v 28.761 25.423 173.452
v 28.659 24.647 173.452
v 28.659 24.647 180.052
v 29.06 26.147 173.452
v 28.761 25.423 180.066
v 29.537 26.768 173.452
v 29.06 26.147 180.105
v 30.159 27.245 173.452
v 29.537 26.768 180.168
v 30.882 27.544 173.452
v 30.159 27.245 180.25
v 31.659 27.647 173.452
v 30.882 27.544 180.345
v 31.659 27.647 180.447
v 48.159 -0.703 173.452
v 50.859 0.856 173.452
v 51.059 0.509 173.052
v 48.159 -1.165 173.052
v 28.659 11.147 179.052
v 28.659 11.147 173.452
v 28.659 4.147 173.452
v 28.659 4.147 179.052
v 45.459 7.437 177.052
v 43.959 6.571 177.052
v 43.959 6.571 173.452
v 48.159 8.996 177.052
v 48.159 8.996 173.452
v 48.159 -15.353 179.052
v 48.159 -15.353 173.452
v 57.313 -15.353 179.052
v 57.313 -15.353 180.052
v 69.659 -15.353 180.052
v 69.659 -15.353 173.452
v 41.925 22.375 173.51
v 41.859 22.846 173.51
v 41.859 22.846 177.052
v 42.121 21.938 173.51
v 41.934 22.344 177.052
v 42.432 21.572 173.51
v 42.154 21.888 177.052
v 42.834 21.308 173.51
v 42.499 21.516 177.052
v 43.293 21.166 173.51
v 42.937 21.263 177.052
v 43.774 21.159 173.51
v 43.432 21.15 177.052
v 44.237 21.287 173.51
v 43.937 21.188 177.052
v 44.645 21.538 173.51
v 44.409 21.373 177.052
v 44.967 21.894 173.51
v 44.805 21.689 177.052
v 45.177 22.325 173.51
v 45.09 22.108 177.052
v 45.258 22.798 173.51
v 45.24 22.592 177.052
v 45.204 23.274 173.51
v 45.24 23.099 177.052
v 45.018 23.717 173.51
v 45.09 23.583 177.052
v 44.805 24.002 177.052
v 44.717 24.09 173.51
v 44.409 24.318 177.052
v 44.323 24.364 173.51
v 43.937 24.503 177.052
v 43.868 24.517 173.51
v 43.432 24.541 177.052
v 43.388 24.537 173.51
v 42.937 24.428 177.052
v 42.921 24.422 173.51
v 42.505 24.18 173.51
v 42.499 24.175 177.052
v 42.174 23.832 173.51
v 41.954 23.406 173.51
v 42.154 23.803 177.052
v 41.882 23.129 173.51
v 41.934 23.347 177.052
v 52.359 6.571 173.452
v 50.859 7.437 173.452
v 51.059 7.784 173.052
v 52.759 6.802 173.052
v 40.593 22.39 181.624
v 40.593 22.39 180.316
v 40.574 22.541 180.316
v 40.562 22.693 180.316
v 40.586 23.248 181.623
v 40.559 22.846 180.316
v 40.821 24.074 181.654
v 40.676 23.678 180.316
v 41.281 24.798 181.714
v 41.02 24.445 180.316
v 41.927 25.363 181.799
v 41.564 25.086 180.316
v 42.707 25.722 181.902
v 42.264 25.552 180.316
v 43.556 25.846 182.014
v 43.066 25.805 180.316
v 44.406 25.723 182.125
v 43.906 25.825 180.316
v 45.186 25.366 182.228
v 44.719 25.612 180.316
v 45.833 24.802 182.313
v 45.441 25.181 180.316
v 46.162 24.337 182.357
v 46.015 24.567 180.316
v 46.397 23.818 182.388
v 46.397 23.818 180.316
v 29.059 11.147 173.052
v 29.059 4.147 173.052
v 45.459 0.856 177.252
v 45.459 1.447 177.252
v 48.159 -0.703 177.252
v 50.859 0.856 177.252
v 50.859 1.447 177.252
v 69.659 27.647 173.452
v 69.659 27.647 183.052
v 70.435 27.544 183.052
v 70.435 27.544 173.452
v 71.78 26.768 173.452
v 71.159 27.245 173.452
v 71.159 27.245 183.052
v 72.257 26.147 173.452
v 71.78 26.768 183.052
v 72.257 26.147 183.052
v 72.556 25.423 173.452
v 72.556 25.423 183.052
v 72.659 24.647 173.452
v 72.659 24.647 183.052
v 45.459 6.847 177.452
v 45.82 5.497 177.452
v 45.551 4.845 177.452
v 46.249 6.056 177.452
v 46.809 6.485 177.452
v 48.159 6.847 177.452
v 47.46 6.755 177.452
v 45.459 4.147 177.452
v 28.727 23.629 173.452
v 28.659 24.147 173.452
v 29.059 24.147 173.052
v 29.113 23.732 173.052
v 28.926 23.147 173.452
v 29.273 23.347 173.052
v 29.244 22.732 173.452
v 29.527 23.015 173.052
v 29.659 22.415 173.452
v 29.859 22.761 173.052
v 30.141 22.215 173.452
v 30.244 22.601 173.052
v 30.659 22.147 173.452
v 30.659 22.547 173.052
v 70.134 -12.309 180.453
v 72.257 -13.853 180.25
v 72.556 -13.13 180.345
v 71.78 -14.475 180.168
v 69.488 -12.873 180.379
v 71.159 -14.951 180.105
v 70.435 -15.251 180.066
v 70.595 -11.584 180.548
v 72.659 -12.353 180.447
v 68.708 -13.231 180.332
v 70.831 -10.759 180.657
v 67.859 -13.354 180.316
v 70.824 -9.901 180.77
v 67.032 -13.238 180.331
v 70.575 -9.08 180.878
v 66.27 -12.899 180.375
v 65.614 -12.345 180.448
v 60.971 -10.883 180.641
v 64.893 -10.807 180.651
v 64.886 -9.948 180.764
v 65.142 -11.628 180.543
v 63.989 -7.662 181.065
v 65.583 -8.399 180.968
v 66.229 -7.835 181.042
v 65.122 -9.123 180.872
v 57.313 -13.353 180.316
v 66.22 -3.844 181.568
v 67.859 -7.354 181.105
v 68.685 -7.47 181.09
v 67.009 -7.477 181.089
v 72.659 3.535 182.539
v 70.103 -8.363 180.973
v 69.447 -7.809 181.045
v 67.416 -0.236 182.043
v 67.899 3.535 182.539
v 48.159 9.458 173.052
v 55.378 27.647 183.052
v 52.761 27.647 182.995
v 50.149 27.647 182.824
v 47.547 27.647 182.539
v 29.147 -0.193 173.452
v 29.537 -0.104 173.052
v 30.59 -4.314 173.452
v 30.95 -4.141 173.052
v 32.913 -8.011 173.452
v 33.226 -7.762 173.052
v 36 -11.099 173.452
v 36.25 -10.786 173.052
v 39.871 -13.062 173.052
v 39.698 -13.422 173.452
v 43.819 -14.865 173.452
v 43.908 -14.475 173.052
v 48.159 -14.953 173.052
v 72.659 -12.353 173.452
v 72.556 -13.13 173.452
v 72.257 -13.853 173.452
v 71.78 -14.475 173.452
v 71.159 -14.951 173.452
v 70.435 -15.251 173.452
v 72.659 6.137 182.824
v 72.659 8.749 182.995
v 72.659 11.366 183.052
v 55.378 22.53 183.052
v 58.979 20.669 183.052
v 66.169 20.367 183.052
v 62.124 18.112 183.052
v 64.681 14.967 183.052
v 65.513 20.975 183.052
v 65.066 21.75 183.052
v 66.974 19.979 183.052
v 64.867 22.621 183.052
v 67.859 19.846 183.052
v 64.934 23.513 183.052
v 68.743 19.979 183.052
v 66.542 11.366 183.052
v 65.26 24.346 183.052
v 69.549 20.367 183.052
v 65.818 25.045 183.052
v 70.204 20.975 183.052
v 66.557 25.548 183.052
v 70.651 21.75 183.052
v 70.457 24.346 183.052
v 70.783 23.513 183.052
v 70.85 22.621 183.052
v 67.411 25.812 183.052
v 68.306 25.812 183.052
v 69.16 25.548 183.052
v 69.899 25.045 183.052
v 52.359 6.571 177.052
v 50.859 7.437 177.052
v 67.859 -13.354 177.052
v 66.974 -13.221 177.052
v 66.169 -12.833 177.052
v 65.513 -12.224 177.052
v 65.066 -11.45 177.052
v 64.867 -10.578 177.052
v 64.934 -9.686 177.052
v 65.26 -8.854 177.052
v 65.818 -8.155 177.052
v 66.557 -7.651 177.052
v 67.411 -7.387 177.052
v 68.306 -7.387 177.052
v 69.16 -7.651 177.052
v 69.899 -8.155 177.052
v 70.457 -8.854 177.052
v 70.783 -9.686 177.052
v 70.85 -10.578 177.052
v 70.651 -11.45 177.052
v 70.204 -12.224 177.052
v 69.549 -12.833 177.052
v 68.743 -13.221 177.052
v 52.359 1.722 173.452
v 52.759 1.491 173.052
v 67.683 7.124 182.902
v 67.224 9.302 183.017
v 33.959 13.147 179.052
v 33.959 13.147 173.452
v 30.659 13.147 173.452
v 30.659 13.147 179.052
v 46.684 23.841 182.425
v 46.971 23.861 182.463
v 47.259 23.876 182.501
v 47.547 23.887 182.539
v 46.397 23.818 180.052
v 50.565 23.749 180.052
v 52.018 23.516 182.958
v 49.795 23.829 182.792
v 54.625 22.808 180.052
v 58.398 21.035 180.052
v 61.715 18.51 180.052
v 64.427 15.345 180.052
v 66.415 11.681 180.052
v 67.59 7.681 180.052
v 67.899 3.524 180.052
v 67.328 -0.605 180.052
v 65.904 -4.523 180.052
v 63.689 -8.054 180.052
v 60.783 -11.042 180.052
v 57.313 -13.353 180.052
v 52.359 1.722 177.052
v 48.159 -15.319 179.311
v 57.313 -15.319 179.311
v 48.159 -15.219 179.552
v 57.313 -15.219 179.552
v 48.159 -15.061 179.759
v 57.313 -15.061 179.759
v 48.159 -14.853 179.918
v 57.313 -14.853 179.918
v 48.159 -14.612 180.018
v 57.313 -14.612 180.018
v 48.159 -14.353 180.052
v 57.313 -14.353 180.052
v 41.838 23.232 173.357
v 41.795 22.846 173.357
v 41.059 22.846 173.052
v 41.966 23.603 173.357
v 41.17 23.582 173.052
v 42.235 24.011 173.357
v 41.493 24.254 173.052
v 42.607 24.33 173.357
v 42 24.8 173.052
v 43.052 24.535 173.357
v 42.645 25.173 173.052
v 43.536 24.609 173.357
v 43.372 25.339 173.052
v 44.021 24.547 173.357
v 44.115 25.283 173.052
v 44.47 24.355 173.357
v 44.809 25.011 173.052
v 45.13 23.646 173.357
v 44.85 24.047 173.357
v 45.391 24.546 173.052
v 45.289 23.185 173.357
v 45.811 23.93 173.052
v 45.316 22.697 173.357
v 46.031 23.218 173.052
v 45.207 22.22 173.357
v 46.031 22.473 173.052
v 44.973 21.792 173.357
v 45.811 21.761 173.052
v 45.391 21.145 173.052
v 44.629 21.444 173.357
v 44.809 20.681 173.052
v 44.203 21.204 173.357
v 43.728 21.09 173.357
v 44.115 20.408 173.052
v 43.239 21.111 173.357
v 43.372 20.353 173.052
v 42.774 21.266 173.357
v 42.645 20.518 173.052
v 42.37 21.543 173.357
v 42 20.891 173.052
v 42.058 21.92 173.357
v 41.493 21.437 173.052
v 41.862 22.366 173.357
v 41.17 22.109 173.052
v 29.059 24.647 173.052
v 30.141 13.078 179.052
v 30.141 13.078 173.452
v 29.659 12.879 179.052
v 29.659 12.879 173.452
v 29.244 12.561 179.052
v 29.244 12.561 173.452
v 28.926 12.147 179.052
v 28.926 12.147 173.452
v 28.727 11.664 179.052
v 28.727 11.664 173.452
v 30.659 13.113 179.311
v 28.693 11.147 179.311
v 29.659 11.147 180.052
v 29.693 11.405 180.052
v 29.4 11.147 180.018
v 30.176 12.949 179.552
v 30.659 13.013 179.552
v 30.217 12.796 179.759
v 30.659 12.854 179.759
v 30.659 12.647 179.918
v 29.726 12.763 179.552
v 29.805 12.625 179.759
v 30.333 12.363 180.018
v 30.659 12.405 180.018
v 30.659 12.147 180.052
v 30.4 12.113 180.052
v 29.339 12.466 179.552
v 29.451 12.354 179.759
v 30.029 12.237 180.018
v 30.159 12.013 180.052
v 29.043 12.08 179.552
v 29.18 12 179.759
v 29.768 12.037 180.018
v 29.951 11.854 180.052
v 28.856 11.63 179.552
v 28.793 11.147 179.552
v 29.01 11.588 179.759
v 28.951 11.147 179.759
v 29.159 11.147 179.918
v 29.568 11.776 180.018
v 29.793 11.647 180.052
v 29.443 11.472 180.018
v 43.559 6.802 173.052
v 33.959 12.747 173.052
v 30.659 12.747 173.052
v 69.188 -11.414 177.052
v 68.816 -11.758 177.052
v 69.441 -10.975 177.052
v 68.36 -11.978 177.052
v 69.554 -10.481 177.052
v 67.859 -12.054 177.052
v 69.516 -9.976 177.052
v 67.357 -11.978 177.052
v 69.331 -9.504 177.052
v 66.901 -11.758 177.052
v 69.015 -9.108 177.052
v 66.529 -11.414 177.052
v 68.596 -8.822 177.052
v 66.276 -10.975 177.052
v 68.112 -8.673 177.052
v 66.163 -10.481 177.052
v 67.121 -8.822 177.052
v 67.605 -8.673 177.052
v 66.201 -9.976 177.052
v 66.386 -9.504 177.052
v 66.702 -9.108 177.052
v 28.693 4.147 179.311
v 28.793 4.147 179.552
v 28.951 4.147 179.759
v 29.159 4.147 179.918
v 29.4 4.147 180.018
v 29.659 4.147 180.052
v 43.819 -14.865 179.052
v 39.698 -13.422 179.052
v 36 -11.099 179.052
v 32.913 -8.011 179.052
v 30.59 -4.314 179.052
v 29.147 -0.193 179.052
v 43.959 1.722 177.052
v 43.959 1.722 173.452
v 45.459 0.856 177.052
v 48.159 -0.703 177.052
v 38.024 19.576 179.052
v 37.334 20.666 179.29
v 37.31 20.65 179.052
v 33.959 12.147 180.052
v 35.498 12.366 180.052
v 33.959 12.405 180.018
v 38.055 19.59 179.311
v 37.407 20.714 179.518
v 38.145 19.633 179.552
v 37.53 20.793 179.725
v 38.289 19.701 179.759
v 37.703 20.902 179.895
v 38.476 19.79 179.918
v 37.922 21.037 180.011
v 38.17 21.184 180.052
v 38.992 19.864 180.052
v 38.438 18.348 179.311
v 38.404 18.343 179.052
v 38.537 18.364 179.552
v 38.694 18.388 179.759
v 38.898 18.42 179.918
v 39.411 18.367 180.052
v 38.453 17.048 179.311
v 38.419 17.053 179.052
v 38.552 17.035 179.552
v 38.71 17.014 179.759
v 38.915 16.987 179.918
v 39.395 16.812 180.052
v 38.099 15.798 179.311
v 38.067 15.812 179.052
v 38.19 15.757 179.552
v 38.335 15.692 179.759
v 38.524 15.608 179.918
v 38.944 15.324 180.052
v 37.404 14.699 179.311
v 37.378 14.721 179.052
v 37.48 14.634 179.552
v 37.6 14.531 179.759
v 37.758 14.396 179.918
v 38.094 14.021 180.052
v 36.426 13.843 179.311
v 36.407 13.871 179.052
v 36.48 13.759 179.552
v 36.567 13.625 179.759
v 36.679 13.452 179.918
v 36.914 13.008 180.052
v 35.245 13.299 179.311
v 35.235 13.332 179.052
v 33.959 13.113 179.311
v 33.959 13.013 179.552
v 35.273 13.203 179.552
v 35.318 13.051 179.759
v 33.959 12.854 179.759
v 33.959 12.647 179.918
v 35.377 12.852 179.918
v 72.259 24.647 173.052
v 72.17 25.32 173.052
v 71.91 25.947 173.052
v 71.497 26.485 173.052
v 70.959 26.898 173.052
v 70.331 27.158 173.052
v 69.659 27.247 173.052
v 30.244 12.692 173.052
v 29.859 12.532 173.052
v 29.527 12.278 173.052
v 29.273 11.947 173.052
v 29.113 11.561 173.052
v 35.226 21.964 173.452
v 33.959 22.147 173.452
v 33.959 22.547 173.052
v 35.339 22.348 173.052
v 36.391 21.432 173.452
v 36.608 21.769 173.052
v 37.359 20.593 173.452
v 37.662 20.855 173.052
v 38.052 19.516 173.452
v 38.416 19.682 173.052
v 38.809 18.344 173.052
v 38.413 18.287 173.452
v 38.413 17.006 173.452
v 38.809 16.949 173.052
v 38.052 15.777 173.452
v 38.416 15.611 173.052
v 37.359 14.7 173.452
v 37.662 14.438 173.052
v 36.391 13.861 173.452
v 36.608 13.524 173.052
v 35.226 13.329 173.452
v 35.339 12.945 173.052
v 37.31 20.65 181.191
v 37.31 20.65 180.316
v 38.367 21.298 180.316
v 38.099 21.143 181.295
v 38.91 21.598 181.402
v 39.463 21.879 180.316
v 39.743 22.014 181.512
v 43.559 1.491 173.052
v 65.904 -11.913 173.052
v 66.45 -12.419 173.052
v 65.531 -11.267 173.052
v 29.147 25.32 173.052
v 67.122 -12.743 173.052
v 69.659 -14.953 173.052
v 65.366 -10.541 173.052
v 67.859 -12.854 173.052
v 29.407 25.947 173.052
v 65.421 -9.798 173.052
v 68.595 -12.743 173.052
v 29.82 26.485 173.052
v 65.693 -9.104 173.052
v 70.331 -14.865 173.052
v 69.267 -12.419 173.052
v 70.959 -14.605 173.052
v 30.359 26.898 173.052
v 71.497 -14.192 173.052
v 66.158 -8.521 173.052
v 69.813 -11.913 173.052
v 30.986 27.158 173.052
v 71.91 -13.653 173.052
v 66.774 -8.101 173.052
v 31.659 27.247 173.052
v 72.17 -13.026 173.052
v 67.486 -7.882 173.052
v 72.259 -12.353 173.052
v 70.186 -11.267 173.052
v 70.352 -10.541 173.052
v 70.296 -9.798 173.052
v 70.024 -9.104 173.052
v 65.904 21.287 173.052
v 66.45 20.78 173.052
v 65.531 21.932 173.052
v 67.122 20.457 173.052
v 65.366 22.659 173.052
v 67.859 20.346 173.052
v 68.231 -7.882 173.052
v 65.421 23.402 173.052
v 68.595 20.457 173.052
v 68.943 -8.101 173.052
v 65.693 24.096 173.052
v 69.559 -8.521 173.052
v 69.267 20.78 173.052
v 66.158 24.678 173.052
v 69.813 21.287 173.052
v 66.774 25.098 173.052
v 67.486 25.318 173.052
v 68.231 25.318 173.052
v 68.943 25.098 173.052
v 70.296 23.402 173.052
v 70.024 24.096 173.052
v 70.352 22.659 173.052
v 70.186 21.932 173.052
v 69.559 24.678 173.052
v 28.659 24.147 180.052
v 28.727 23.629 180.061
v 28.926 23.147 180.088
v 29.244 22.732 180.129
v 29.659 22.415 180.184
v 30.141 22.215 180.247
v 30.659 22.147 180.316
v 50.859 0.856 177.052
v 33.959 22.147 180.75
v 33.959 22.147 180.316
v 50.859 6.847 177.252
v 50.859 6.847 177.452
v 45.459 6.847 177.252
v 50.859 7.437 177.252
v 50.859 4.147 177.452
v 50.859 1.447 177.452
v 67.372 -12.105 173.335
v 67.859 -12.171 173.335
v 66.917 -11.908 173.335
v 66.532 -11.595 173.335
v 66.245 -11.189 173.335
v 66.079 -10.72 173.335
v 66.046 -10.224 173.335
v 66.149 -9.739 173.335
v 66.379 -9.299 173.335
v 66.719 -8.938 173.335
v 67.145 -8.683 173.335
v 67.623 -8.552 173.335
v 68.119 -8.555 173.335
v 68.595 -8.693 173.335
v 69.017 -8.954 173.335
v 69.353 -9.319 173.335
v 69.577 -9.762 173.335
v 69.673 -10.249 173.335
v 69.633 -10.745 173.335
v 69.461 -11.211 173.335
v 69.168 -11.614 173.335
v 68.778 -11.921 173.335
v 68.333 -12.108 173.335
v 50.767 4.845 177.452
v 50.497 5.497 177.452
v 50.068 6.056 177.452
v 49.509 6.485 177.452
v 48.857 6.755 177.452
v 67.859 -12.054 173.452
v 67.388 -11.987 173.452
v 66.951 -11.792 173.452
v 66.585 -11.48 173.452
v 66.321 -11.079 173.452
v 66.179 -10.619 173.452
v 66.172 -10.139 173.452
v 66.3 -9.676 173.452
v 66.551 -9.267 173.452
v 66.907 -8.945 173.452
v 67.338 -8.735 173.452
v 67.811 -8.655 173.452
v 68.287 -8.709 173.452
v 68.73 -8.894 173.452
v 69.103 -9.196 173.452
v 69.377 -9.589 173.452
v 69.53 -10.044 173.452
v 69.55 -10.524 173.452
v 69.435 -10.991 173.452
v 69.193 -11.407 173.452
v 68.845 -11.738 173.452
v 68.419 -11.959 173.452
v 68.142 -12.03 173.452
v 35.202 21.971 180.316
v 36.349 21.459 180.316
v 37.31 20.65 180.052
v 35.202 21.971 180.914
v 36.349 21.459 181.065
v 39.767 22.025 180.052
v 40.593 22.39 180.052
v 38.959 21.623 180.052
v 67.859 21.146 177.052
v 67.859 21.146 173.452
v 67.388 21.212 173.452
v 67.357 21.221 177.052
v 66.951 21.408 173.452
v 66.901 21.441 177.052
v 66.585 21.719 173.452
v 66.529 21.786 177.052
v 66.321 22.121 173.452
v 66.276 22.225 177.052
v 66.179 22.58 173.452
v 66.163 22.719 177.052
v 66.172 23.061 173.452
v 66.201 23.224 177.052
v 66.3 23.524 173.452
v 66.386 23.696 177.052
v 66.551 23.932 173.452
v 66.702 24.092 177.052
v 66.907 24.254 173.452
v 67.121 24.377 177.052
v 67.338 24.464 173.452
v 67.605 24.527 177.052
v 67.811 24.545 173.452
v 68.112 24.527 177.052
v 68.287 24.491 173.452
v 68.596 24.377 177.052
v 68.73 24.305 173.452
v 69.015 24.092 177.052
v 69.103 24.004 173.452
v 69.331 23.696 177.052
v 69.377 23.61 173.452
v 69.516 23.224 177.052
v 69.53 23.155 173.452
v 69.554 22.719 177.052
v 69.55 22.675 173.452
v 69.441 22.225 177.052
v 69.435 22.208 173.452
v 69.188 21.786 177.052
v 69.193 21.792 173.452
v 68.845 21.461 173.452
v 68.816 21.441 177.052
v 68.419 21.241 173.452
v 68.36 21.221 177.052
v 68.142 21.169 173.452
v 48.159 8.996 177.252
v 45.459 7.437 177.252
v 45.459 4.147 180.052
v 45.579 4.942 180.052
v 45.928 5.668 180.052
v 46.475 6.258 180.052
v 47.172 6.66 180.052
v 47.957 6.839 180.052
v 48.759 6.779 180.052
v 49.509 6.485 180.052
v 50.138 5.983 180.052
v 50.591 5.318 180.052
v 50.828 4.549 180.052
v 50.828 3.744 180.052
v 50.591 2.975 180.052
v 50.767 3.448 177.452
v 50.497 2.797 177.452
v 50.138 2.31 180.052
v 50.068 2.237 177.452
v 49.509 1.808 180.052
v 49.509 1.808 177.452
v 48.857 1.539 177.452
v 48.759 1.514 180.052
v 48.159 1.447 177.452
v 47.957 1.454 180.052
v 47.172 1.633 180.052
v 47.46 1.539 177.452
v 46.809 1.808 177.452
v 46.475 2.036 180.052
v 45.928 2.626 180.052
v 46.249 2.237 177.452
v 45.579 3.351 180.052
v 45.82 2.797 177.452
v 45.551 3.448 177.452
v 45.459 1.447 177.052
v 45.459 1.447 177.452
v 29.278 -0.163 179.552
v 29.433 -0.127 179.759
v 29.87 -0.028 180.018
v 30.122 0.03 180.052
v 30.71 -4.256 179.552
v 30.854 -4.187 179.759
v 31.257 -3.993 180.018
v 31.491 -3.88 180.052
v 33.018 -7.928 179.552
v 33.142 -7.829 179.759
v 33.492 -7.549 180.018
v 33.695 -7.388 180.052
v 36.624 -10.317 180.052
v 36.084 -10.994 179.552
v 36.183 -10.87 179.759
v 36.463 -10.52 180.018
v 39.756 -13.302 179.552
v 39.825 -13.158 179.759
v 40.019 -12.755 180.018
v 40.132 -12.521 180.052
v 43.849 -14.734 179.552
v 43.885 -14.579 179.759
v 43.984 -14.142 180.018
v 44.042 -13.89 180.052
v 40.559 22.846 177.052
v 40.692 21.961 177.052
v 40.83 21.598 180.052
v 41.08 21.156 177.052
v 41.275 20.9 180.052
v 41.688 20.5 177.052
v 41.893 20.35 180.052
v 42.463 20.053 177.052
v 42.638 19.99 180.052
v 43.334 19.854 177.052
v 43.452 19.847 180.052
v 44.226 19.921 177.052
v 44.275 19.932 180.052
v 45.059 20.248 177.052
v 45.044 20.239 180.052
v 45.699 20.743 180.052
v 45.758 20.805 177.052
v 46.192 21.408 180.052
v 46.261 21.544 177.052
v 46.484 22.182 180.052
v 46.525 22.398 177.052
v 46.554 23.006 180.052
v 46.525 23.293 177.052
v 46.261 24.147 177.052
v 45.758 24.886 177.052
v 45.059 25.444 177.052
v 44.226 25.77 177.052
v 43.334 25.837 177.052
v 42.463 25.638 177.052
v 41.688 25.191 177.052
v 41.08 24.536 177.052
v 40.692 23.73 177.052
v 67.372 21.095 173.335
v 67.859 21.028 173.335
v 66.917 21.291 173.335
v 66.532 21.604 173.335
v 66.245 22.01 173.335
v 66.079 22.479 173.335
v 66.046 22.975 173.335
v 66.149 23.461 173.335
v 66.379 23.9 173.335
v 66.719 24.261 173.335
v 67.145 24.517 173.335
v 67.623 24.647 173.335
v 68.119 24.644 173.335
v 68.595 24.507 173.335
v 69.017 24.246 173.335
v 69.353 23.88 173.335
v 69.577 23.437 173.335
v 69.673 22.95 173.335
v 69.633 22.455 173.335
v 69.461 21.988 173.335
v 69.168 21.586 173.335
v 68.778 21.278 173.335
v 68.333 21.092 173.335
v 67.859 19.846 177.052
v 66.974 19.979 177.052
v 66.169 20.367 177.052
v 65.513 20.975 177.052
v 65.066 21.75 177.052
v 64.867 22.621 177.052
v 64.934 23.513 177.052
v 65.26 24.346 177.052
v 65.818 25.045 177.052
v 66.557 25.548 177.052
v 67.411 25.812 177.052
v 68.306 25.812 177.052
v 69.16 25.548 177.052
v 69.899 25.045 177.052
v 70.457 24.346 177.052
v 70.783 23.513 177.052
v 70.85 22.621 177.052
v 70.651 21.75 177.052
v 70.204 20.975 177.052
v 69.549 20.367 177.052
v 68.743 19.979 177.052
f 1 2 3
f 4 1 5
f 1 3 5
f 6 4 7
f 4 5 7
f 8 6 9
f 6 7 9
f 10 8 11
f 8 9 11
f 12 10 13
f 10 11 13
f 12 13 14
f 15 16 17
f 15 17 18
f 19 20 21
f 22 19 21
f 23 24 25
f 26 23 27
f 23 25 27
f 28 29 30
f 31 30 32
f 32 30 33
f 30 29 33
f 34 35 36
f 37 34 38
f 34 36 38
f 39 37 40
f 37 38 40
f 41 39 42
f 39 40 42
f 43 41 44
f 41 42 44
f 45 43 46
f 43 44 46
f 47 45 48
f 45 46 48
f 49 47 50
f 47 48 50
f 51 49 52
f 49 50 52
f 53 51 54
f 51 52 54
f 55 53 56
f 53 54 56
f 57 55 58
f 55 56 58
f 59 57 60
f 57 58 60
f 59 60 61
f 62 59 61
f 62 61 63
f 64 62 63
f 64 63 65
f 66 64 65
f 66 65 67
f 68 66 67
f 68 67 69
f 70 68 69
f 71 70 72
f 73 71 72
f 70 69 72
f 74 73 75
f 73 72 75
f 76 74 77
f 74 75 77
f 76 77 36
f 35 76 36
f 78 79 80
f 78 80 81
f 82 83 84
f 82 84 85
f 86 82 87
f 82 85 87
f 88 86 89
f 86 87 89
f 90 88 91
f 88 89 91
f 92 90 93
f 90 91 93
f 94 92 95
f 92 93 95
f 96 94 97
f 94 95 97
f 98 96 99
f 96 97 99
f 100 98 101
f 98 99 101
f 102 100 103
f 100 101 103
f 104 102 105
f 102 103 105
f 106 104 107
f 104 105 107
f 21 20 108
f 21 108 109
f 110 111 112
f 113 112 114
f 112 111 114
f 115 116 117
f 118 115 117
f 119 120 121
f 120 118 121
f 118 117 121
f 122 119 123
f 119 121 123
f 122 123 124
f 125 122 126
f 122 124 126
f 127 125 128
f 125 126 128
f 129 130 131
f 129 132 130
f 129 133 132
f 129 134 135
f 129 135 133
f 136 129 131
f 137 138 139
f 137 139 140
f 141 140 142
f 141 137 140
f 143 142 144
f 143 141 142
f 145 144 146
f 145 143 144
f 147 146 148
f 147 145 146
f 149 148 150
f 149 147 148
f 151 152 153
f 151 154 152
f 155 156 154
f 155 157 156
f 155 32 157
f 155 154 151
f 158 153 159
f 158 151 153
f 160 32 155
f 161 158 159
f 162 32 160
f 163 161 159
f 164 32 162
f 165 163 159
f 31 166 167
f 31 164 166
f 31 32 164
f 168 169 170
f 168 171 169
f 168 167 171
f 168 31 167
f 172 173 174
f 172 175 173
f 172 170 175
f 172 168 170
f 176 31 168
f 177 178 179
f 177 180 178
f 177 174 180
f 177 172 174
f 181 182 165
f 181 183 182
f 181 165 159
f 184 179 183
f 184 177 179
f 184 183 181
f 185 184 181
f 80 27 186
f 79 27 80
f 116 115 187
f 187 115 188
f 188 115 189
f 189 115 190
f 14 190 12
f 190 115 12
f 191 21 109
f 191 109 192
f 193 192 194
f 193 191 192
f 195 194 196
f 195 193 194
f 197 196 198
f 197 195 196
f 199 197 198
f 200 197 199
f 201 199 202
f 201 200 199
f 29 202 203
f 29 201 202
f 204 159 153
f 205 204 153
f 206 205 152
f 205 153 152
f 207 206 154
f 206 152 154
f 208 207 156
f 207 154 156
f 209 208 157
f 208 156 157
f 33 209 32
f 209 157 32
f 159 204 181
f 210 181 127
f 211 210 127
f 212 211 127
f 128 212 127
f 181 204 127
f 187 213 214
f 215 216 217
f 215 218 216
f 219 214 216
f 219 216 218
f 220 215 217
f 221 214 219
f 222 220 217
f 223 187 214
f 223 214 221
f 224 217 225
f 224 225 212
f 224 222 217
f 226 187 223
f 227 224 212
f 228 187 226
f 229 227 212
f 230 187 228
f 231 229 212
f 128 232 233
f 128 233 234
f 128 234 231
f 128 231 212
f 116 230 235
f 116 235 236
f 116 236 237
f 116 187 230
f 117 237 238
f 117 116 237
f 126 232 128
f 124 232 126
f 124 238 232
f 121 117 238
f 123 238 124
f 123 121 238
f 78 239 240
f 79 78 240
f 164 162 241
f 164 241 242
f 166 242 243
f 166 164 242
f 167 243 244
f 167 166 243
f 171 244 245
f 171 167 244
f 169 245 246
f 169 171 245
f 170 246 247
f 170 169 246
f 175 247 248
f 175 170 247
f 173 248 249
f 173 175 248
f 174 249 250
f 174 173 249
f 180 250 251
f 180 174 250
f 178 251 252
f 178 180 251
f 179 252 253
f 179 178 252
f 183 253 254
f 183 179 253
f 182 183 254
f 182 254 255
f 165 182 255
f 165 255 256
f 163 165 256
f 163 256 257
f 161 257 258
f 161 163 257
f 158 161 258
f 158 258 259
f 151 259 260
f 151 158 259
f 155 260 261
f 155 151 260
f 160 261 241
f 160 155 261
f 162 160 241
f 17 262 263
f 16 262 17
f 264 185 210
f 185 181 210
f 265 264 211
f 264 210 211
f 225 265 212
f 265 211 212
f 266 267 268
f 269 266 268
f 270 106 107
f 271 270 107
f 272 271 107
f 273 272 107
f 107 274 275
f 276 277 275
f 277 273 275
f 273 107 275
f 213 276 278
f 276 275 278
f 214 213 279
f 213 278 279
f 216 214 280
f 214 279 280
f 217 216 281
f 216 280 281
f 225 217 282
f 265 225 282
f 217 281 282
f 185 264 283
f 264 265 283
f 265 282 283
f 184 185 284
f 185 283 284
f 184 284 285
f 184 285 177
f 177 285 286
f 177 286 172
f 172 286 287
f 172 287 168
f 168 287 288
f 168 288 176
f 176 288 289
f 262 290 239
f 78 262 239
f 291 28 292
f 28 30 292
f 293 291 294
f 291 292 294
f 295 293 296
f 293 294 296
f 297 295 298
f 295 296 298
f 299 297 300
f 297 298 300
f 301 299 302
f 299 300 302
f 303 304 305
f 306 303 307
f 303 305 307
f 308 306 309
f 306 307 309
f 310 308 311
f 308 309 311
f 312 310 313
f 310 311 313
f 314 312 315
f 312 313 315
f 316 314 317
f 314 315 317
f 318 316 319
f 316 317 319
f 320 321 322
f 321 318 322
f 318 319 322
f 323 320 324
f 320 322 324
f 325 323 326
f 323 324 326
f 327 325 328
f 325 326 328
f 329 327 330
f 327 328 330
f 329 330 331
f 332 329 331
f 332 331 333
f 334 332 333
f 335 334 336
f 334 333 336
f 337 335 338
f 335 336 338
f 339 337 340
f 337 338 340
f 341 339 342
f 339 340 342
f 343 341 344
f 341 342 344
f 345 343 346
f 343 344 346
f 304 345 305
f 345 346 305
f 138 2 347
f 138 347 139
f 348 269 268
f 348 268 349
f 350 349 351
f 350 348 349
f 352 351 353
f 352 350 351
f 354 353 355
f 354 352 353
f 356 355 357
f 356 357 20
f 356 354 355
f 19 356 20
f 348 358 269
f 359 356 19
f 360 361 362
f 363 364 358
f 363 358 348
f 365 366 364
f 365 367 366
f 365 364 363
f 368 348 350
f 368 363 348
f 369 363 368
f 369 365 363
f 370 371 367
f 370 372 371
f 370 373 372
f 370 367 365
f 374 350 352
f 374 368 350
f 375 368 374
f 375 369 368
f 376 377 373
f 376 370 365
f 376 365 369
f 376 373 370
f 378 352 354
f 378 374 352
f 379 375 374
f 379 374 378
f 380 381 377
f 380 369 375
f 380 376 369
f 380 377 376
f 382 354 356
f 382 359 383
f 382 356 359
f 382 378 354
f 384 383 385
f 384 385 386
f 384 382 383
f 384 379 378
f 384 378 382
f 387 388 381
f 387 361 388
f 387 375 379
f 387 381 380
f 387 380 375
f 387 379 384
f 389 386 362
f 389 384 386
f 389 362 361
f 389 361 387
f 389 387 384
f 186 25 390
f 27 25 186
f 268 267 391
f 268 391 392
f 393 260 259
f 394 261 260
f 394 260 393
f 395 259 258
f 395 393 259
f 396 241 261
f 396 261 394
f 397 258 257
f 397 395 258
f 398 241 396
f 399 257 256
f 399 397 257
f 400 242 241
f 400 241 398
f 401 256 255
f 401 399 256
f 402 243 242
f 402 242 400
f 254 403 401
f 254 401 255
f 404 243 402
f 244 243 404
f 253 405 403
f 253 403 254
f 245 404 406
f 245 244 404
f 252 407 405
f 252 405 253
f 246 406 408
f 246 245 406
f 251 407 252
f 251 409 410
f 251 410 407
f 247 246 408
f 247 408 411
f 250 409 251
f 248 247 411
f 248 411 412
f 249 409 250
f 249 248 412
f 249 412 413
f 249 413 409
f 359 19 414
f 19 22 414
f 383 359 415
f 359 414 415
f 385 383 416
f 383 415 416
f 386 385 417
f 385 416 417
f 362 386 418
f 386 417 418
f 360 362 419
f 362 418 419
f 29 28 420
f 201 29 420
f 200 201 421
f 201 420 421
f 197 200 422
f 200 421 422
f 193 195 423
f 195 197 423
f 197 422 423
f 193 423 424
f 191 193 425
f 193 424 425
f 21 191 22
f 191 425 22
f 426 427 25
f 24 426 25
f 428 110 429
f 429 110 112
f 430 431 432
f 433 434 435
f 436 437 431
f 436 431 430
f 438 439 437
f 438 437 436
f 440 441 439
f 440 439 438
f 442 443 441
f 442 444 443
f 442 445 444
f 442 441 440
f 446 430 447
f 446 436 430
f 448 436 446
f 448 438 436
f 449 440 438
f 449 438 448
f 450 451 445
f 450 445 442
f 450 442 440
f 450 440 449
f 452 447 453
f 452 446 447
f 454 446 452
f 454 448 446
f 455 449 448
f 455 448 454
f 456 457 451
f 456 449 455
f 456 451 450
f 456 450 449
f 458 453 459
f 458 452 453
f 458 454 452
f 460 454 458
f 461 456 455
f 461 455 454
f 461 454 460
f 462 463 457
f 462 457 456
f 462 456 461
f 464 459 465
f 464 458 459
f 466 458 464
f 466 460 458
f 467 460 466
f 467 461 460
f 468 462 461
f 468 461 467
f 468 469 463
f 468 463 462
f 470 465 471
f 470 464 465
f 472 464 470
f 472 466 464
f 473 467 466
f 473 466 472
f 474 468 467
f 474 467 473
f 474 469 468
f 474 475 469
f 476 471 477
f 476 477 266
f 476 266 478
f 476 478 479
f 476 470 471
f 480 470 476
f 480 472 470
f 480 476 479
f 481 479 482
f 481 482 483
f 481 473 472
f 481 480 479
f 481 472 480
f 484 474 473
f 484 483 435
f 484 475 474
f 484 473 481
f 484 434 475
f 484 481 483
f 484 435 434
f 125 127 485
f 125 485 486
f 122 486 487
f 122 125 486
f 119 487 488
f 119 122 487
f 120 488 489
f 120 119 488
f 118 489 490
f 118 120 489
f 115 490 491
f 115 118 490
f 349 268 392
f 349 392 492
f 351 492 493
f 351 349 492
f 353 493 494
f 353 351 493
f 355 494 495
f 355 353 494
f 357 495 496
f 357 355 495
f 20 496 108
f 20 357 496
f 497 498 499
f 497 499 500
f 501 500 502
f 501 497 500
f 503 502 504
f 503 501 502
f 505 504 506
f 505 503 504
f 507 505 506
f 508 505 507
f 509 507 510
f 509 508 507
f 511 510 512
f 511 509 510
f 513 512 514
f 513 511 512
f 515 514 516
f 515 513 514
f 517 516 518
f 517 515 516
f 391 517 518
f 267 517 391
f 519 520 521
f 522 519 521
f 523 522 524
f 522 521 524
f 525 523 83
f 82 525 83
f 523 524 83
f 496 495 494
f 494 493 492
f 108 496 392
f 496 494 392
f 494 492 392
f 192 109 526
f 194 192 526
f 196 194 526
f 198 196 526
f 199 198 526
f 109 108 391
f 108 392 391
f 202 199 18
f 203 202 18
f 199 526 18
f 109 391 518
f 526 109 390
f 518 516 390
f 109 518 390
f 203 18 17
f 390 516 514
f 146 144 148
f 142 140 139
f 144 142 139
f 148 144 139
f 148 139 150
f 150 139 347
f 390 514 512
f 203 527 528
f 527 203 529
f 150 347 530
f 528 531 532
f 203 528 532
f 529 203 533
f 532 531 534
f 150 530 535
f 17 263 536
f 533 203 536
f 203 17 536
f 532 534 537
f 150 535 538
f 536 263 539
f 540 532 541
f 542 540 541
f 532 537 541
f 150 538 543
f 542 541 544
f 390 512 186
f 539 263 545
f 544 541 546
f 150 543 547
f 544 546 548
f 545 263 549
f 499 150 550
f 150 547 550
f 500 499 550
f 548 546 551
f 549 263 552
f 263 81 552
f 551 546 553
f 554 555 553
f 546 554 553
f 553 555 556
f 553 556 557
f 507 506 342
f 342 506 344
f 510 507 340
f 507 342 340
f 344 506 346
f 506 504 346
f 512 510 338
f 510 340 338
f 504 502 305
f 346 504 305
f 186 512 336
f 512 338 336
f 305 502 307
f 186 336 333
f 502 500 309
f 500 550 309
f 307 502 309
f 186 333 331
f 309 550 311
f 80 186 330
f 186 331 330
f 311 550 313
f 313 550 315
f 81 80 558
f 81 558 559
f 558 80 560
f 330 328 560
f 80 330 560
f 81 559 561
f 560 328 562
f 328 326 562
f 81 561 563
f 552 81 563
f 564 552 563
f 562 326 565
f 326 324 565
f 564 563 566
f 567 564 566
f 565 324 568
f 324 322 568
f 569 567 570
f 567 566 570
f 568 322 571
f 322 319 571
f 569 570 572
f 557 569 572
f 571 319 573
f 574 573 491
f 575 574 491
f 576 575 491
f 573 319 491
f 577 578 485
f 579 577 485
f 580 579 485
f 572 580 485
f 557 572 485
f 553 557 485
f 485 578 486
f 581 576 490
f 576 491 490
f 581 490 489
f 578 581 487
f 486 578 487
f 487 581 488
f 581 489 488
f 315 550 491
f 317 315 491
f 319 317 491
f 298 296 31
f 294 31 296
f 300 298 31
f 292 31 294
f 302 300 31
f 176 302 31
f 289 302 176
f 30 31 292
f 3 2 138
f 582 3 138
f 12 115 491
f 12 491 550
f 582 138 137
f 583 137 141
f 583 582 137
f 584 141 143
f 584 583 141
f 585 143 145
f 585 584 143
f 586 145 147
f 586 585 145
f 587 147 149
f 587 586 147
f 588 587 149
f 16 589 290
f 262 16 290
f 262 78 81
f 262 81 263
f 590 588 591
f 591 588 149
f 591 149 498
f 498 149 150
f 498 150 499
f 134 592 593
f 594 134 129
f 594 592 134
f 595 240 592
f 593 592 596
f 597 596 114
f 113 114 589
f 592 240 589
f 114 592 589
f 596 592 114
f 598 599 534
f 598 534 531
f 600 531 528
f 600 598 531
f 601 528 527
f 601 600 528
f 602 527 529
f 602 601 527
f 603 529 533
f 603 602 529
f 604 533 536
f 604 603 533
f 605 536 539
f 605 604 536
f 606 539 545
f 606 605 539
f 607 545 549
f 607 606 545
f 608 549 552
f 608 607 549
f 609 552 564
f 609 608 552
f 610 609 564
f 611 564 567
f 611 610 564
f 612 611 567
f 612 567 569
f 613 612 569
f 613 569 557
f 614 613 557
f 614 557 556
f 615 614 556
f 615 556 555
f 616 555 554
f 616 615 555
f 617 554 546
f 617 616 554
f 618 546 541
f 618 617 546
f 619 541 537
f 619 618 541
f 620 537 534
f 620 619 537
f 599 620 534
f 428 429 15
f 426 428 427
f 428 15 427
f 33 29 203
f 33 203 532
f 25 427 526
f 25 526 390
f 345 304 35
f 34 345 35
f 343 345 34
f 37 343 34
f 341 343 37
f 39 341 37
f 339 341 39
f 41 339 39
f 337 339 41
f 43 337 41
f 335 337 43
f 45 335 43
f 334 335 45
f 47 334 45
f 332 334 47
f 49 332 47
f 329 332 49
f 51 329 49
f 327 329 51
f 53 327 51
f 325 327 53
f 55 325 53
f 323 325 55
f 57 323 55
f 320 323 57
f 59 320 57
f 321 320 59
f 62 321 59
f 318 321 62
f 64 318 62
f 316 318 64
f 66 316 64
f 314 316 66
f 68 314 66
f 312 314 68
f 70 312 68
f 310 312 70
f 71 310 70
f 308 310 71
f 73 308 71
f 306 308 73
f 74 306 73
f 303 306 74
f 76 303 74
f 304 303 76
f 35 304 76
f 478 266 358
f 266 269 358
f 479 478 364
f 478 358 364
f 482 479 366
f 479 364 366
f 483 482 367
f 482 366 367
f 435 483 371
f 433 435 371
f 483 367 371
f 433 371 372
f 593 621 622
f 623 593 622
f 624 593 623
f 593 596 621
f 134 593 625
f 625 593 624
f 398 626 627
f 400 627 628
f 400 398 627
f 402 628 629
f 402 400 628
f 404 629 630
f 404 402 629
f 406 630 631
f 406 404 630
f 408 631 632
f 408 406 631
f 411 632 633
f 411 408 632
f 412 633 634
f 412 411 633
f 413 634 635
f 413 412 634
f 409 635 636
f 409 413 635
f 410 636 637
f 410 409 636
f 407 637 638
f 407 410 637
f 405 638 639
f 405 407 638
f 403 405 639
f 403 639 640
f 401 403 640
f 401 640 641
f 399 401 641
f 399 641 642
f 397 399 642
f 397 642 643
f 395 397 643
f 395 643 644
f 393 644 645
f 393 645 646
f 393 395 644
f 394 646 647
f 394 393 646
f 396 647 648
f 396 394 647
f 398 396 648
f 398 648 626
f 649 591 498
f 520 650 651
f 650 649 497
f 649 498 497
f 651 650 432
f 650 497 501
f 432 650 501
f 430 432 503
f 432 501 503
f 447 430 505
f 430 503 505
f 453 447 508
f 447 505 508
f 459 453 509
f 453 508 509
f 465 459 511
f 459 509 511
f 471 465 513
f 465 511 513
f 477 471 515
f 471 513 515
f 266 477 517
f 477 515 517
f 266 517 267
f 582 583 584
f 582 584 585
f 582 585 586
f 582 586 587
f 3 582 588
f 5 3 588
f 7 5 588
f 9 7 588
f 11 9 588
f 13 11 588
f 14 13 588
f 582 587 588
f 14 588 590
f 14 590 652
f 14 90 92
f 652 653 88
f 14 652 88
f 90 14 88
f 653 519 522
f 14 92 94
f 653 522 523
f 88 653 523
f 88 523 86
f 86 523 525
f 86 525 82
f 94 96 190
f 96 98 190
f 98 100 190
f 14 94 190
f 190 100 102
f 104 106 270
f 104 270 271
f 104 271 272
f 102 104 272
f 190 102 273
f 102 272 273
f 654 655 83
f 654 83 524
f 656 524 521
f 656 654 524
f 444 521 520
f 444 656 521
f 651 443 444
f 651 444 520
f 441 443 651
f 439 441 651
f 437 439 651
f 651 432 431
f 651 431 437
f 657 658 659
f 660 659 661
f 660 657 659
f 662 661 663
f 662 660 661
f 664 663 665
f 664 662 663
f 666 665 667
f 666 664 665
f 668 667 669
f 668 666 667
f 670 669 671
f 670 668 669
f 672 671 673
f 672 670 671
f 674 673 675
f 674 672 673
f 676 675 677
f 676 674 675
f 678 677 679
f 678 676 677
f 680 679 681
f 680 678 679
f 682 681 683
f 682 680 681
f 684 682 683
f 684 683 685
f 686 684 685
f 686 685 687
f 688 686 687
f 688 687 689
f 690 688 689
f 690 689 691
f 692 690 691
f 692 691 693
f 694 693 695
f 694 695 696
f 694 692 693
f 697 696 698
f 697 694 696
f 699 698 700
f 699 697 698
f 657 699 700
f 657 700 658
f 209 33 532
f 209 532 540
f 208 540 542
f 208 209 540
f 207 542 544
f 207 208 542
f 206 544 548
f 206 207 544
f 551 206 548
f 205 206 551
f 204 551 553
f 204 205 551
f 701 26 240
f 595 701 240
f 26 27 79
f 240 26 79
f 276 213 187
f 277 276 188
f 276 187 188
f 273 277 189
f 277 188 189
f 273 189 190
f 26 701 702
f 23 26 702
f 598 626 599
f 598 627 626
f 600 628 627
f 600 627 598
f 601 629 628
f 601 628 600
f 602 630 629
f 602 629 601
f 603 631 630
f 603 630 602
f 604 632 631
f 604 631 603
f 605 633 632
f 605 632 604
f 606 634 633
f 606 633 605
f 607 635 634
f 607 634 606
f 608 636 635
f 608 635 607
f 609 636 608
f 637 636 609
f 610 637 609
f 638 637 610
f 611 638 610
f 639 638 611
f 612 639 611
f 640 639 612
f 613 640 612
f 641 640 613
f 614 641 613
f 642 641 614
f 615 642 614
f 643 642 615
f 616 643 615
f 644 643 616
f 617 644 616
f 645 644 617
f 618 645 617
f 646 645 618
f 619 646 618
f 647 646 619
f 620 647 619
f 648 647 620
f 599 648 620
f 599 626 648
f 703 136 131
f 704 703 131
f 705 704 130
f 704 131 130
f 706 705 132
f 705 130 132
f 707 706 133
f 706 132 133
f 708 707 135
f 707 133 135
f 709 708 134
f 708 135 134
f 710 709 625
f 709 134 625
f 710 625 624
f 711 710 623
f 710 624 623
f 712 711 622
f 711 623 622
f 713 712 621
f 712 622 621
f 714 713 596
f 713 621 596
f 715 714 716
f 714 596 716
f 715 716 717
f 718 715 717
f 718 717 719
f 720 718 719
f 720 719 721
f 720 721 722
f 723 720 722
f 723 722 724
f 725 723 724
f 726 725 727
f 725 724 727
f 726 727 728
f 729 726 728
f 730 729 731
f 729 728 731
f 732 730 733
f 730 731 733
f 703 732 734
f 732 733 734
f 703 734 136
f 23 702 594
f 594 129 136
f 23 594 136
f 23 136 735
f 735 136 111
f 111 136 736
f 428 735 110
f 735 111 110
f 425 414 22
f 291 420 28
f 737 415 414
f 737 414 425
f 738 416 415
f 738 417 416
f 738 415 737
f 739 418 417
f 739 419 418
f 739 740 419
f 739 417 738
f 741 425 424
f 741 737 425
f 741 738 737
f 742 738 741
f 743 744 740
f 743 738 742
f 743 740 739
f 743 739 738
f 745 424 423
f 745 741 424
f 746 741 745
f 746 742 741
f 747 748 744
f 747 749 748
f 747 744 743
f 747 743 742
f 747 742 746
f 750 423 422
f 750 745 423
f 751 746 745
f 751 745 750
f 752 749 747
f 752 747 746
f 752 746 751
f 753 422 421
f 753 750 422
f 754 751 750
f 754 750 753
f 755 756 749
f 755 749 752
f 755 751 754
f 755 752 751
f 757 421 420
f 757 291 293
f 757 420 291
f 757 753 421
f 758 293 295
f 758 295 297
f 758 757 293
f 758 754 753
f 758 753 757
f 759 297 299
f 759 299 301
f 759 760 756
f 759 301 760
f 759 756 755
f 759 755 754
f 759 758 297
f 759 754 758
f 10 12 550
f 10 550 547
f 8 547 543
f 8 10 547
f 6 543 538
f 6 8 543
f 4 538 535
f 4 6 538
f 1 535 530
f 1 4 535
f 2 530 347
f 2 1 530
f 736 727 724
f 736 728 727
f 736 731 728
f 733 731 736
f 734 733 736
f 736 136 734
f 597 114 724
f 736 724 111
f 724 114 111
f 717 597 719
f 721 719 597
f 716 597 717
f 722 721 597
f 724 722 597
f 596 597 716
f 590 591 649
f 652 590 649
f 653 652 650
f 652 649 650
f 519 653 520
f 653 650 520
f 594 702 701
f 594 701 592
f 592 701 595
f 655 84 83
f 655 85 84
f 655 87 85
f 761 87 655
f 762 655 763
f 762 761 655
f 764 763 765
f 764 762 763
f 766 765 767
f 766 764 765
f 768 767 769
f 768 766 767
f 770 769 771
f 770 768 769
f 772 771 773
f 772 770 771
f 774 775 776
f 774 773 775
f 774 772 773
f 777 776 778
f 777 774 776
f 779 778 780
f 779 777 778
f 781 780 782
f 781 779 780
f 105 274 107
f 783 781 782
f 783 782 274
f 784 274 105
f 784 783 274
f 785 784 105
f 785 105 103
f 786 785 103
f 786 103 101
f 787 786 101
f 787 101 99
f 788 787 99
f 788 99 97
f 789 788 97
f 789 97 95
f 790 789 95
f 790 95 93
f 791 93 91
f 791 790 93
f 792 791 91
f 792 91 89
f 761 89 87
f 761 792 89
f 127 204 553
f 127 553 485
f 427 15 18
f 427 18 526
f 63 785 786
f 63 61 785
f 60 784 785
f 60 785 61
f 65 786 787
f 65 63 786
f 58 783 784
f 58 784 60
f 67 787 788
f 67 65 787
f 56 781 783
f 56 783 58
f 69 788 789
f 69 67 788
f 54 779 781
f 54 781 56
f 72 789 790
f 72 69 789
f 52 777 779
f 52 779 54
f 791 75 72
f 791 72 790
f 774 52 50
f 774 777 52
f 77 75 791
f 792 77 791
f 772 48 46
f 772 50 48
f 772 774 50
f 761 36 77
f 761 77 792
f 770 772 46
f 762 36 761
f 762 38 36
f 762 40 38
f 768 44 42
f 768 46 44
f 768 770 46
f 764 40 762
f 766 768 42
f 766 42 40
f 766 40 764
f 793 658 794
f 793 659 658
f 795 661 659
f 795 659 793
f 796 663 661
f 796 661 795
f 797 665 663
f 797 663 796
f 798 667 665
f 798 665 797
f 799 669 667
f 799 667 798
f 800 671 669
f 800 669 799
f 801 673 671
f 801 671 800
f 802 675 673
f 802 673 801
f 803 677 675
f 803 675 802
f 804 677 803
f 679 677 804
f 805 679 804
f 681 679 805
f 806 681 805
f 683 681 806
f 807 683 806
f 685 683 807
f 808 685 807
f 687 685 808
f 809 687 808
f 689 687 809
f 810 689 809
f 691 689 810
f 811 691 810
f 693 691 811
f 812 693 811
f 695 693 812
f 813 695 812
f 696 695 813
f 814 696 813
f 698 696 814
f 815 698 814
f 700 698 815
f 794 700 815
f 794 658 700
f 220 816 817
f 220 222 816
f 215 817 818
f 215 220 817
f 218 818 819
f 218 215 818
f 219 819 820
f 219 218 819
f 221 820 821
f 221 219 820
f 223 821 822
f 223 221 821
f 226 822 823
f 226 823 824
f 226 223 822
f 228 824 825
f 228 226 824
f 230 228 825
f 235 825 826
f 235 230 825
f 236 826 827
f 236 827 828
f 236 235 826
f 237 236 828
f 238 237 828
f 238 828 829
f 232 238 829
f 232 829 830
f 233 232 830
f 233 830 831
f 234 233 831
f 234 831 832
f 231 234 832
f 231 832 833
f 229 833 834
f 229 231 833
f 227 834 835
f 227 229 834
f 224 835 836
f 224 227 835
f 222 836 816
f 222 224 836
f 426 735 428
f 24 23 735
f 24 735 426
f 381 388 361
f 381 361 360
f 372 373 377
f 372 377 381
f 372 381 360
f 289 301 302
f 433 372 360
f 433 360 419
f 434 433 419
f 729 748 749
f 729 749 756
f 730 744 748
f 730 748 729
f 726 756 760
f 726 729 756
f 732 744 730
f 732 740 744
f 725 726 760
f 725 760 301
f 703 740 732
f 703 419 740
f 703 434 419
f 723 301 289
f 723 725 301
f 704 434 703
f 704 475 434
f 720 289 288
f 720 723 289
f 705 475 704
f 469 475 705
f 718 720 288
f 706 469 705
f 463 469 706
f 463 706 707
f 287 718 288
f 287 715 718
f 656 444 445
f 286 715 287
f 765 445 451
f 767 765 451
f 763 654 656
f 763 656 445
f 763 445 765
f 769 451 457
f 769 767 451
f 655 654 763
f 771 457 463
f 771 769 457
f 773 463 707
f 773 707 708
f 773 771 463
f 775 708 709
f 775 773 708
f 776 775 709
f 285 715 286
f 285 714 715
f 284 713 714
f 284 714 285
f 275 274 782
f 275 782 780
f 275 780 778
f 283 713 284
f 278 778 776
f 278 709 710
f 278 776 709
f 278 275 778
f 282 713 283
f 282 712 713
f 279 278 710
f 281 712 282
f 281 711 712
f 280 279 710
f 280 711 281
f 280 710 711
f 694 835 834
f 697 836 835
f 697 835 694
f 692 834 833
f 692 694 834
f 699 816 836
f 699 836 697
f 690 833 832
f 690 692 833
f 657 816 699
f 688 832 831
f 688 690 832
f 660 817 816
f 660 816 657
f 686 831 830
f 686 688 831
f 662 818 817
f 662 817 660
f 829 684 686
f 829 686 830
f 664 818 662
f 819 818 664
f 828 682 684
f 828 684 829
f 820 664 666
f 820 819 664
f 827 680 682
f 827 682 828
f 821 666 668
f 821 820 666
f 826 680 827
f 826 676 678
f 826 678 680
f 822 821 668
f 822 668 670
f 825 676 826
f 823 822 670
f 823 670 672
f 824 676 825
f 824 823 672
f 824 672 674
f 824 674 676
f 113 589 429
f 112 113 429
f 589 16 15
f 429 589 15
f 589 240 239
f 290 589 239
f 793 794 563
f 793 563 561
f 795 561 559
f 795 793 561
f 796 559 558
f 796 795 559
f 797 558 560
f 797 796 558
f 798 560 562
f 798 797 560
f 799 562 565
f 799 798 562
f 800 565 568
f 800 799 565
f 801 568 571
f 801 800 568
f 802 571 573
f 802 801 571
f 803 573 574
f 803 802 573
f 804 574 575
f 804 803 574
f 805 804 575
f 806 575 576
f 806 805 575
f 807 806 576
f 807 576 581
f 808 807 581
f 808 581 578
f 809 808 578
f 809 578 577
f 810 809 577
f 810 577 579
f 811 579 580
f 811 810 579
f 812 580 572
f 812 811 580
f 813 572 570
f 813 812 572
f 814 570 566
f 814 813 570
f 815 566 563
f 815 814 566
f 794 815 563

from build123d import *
from OCP.BRepFilletAPI import BRepFilletAPI_MakeChamfer

# Parameters (mm, degrees)
CUT_EXTRUDE1_START         = -8.138931699
CUT_EXTRUDE1_DEPTH         = 7.263304995
CUT_EXTRUDE1_START_2       = -0.875626704
CUT_EXTRUDE1_2_DEPTH       = 2.736695005
CUT_EXTRUDE1_START_3       = 57.3134639
CUT_EXTRUDE1_3_DEPTH       = 15.345083288
CUT_EXTRUDE1_START_4       = -177.745546793
CUT_EXTRUDE1_4_OUTLINE_W   = 26
CUT_EXTRUDE1_4_OUTLINE_H   = 8.646582531
CUT_EXTRUDE1_4_DEPTH       = 2.974334584
CUT_EXTRUDE2_START         = -3.263295925
SKETCH2_R                  = 3
CUT_EXTRUDE2_DEPTH         = 3.263295925
CUT_EXTRUDE3_START         = -0.263304995
CUT_EXTRUDE3_DEPTH         = 0.263304995
CUT_EXTRUDE4_DEPTH         = 4
SKETCH5_W                  = 5.4
SKETCH5_H                  = 5.4
CUT_EXTRUDE5_DEPTH         = 0.4
CUT_EXTRUDE6_REACH         = 79.957
CUT_EXTRUDE7_REACH         = 79.957
CUT_EXTRUDE8_REACH         = 79.972
SKETCH12_R                 = 1.7
CUT_EXTRUDE9_DEPTH         = 3.66863822
SKETCH13_R                 = 2.5
CUT_EXTRUDE10_DEPTH        = 0.33137085
CUT_EXTRUDE10_DRAFT        = -67.5
F_5_4_5_4_DIAMETER_HOLE1_D = 5.4
FILLET1_R                  = 2
FILLET2_R                  = 3
FILLET3_R                  = 19.5
FILLET4_R                  = 60
CHAMFER1_SIZE              = 0.06862915
CHAMFER1_SIZE2             = 0.126810134
CHAMFER2_SIZE              = 0.4
FILLET6_R                  = 1


with BuildPart() as part:
    # Cut-Extrude1: read off the stored shape, not the designer's step
    # Cut-Extrude1 outline → Cut-Extrude1 (new body)
    with BuildSketch(Plane.XY.offset(181.191207123).offset(CUT_EXTRUDE1_START)):
        with BuildLine():
            Line((33.958547188, 13.146582531), (28.658547188, 13.146582531))
            Line((28.658547188, 13.146582531), (28.658547188, -15.353417469))
            Line((28.658547188, -15.353417469), (72.658547188, -15.353417469))
            Line((72.658547188, -15.353417469), (72.658547188, 27.646582531))
            Line((72.658547188, 27.646582531), (28.658547188, 27.646582531))
            Line((28.658547188, 27.646582531), (28.658547188, 22.146582531))
            Line((28.658547188, 22.146582531), (33.958547188, 22.146582531))
            ThreePointArc((33.958547188, 22.146582531), (38.458547188, 17.646582531), (33.958547188, 13.146582531))
        make_face()
    extrude(amount=CUT_EXTRUDE1_DEPTH)

    # Cut-Extrude1 2 outline → Cut-Extrude1 2 (add)
    with BuildSketch(Plane.XY.offset(181.191207123).offset(CUT_EXTRUDE1_START_2)):
        with BuildLine():
            Line((57.3134639, -13.353417469), (57.3134639, -15.353417469))
            Line((57.3134639, -15.353417469), (72.658547188, -15.353417469))
            Line((72.658547188, -15.353417469), (72.658547188, 27.646582531))
            Line((72.658547188, 27.646582531), (28.658547188, 27.646582531))
            Line((28.658547188, 27.646582531), (28.658547188, 22.146582531))
            Line((28.658547188, 22.146582531), (33.958547188, 22.146582531))
            ThreePointArc((33.958547188, 22.146582531), (35.793572578, 21.755436607), (37.309592323, 20.649996673))
            ThreePointArc((37.309592323, 20.649996673), (38.910429164, 21.597508381), (40.593311101, 22.390203415))
            ThreePointArc((40.593311101, 22.390203415), (42.841906799, 25.758729522), (46.396632901, 23.817834602))
            ThreePointArc((46.396632901, 23.817834602), (67.108207247, 9.711911241), (57.3134639, -13.353417469))
        make_face()
    extrude(amount=CUT_EXTRUDE1_2_DEPTH)

    # Cut-Extrude1 3 outline → Cut-Extrude1 3 (cut)
    with BuildSketch(Plane.YZ.offset(CUT_EXTRUDE1_START_3)):
        Polygon((-15.353417469, 183.052275424), (-15.353417469, 180.052275424), (7.433844869, 183.052275424), align=None)
    extrude(amount=CUT_EXTRUDE1_3_DEPTH, mode=Mode.SUBTRACT)

    # Cut-Extrude1 4 outline → Cut-Extrude1 4 (cut)
    with BuildSketch(Plane(origin=(0, 0, 0), x_dir=(0.9914448613737413, 0, 0.1305261922205761), z_dir=(0.13052619222057607, 0, -0.9914448613737414)).offset(CUT_EXTRUDE1_START_4)):
        with Locations((63, -23.323291265)):
            Rectangle(CUT_EXTRUDE1_4_OUTLINE_W, CUT_EXTRUDE1_4_OUTLINE_H)
    extrude(amount=CUT_EXTRUDE1_4_DEPTH, mode=Mode.SUBTRACT)

    # Sketch2 → Cut-Extrude2 (cut)
    with BuildSketch(Plane.XY.offset(180.31558042).offset(CUT_EXTRUDE2_START)):
        with Locations(Location((43.558547999, 22.845582531, 0), (0, 0, 180))):
            Circle(SKETCH2_R)
    extrude(amount=CUT_EXTRUDE2_DEPTH, mode=Mode.SUBTRACT)

    # Sketch3 → Cut-Extrude3 (cut)
    with BuildSketch(Plane.XY.offset(180.31558042).offset(CUT_EXTRUDE3_START)):
        with BuildLine():
            Line((28.658547188, -15.353417469), (57.3134639, -15.353417469))
            Line((57.3134639, -15.353417469), (57.3134639, -13.353417469))
            ThreePointArc((57.3134639, -13.353417469), (67.108207247, 9.711911241), (46.396632901, 23.817834602))
            ThreePointArc((46.396632901, 23.817834602), (44.275189199, 19.93243554), (40.593311101, 22.390203415))
            ThreePointArc((40.593311101, 22.390203415), (38.910429164, 21.597508381), (37.309592322, 20.649996673))
            ThreePointArc((37.309592322, 20.649996673), (38.067401264, 15.811557141), (33.958547188, 13.146582531))
            Line((33.958547188, 13.146582531), (28.658547188, 13.146582531))
            Line((28.658547188, 13.146582531), (28.658547188, -15.353417469))
        make_face()
    extrude(amount=CUT_EXTRUDE3_DEPTH, mode=Mode.SUBTRACT)

    # Sketch4 → Cut-Extrude4 (cut)
    with BuildSketch(Plane(origin=(0, 0, 173.052275424), x_dir=(-1, 0, 0), z_dir=(0, 0, -1))):
        Polygon((-43.958547188, 6.571453662), (-48.158547188, 8.996324792), (-50.858547188, 7.437479065), (-50.858547188, 0.855685997), (-48.158547188, -0.70315973), (-43.958547188, 1.7217114), align=None)
    extrude(amount=-CUT_EXTRUDE4_DEPTH, mode=Mode.SUBTRACT)

    # Sketch5 → Cut-Extrude5 (cut)
    with BuildSketch(Plane(origin=(0, 0, 177.052275424), x_dir=(-1, 0, 0), z_dir=(0, 0, -1))):
        with Locations((-48.158547188, 4.146582531)):
            Rectangle(SKETCH5_W, SKETCH5_H)
    extrude(amount=-CUT_EXTRUDE5_DEPTH, mode=Mode.SUBTRACT)

    # Sketch7 → Cut-Extrude6 (cut, up to next)
    with BuildSketch(Plane.XY.offset(177.252275424), mode=Mode.PRIVATE) as cut_extrude6_sk1:
        Polygon((48.158547188, 8.996324792), (45.458547188, 7.437479065), (45.458547188, 6.846582531), (50.858547188, 6.846582531), (50.858547188, 7.437479065), align=None)
    cut_extrude6_tool1 = extrude(cut_extrude6_sk1.sketch, amount=-CUT_EXTRUDE6_REACH, mode=Mode.PRIVATE) & part.part
    add(cut_extrude6_tool1.solids().sort_by_distance((48.158547, 7.60563, 177.252275))[0], mode=Mode.SUBTRACT)

    # Sketch9 → Cut-Extrude7 (cut, up to next)
    with BuildSketch(Plane.XY.offset(177.252275424), mode=Mode.PRIVATE) as cut_extrude7_sk1:
        Polygon((48.158547188, -0.70315973), (50.858547188, 0.855685997), (50.858547188, 1.446582531), (45.458547188, 1.446582531), (45.458547188, 0.855685997), align=None)
    cut_extrude7_tool1 = extrude(cut_extrude7_sk1.sketch, amount=-CUT_EXTRUDE7_REACH, mode=Mode.PRIVATE) & part.part
    add(cut_extrude7_tool1.solids().sort_by_distance((48.158547, 0.687535, 177.252275))[0], mode=Mode.SUBTRACT)

    # Sketch11 → Cut-Extrude8 (cut, up to next)
    with BuildSketch(Plane.XY.offset(177.052275424), mode=Mode.PRIVATE) as cut_extrude8_sk1:
        Polygon((50.858547188, 7.437479065), (50.858547188, 0.855685997), (52.358547188, 1.7217114), (52.358547188, 6.571453662), align=None)
    cut_extrude8_tool1 = extrude(cut_extrude8_sk1.sketch, amount=-CUT_EXTRUDE8_REACH, mode=Mode.PRIVATE) & part.part
    add(cut_extrude8_tool1.solids().sort_by_distance((51.570668, 4.146583, 177.052275))[0], mode=Mode.SUBTRACT)

    # Sketch12 → Cut-Extrude9 (cut)
    with BuildSketch(Plane.XY.offset(177.052284495)):
        with Locations(Location((43.558547999, 22.845582531, 0), (0, 0, 180))):
            Circle(SKETCH12_R)
    extrude(amount=-CUT_EXTRUDE9_DEPTH, mode=Mode.SUBTRACT)


with BuildPart() as cut_extrude10_tool:
    # Sketch13 → Cut-Extrude10 (with draft: the straight prism first)
    with BuildSketch(Plane(origin=(0, 0, 173.052275424), x_dir=(-1, 0, 0), z_dir=(0, 0, -1))):
        with Locations((-43.558547999, 22.845582531)):
            Circle(SKETCH13_R)
    extrude(amount=-CUT_EXTRUDE10_DEPTH)
    # Cut-Extrude10: the draft: its side faces are tilted about the plane it starts from
    cut_extrude10_sides = [cut_extrude10_tool.faces().sort_by_distance(p)[0] for p in [
        (46.058547999, 22.845582531, 173.217960849),
    ]]
    draft(cut_extrude10_sides, Plane(origin=(0, 0, 173.052275424), x_dir=(-1, 0, 0), z_dir=(0, 0, -1)), CUT_EXTRUDE10_DRAFT)


with BuildPart() as part_1:
    add(part.part)

    # Cut-Extrude10: cut by cut_extrude10_tool
    add(cut_extrude10_tool.part, mode=Mode.SUBTRACT)

    # Ø5.4 (5.4) Diameter Hole1 (through all)
    with Locations(Plane.XY.offset(180.052275424)):
        with Locations((48.158547188, 4.146582531)):
            Hole(F_5_4_5_4_DIAMETER_HOLE1_D / 2)

    # Sketch16 → CBORE for M3 Hex Head Machine Screw1 (revolve, cut)
    with BuildSketch(Plane(origin=(67.858547188, -10.35389299, 181.105432802), x_dir=(0, -1, 0), z_dir=(1, 0, 0))):
        Polygon((0, 0), (0, 8.053157377), (2.5, 8.053157377), (1.7, 7.721786527), (1.7, 4.053148307), (3, 4.053148307), (3, 0), align=None)
    revolve(axis=Axis((67.858547188, -10.35389299, 187.455432802), (0, 0, -1)), mode=Mode.SUBTRACT)

    # Sketch18 → CBORE for M3 Hex Head Machine Screw2 (revolve, cut)
    with BuildSketch(Plane(origin=(67.858547188, 22.845582531, 183.052275424), x_dir=(0, -1, 0), z_dir=(1, 0, 0))):
        Polygon((0, 0), (0, 10), (2.5, 10), (1.7, 9.66862915), (1.7, 5.99999093), (3, 5.99999093), (3, 0), align=None)
    revolve(axis=Axis((67.858547188, 22.845582531, 189.402275424), (0, 0, -1)), mode=Mode.SUBTRACT)

    # Fillet1
    fillet1_edges = [part_1.edges().sort_by_distance(p)[0] for p in [
        (28.658547188, 22.146582531, 176.552275424),
        (28.658547188, 13.146582531, 176.552275424),
    ]]
    fillet(fillet1_edges, radius=FILLET1_R)

    # Fillet2
    fillet2_edges = [part_1.edges().sort_by_distance(p)[0] for p in [
        (72.658547188, 27.646582531, 178.052275424),
        (72.658547188, -15.353417469, 176.552275424),
        (28.658547188, 27.646582531, 176.552275424),
    ]]
    fillet(fillet2_edges, radius=FILLET2_R)

    # Fillet3
    fillet3_edges = [part_1.edges().sort_by_distance(p)[0] for p in [
        (28.658547188, -15.353417469, 176.552275424),
    ]]
    fillet(fillet3_edges, radius=FILLET3_R)

    # Fillet4
    fillet4_edges = [part_1.edges().sort_by_distance(p)[0] for p in [
        (70.145800475, 7.433844869, 183.052275424),
        (51.445809525, 25.633835818, 183.052275424),
    ]]
    fillet(fillet4_edges, radius=FILLET4_R)

    # Chamfer1: one chamfer whose edges measure the first distance from different faces: ONE call of the kernel's chamfer builder (chamfer() names one face for all edges)
    chamfer1_edges_1 = [part_1.edges().sort_by_distance(p)[0] for p in [
        (45.258547999, 22.845582531, 173.383646274),
    ]]
    chamfer1_side_1 = [part_1.faces().sort_by_distance(p)[0] for p in [
        (45.658547999, 22.845582531, 173.217960849),
    ]]
    chamfer1_edges_2 = [part_1.edges().sort_by_distance(p)[0] for p in [
        (67.858547188, -8.65389299, 173.383646274),
    ]]
    chamfer1_side_2 = [part_1.faces().sort_by_distance(p)[0] for p in [
        (67.858547188, -8.65389299, 175.217965384),
    ]]
    chamfer1_edges_3 = [part_1.edges().sort_by_distance(p)[0] for p in [
        (67.858547188, 24.545582531, 173.383646274),
    ]]
    chamfer1_side_3 = [part_1.faces().sort_by_distance(p)[0] for p in [
        (67.858547188, 24.545582531, 175.217965384),
    ]]
    chamfer1 = BRepFilletAPI_MakeChamfer(part_1.part.solid().wrapped)
    for e in chamfer1_edges_1:
        chamfer1.Add(CHAMFER1_SIZE, CHAMFER1_SIZE2, e.wrapped, chamfer1_side_1[0].wrapped)  # the first distance lies on this face
    for e in chamfer1_edges_2:
        chamfer1.Add(CHAMFER1_SIZE, CHAMFER1_SIZE2, e.wrapped, chamfer1_side_2[0].wrapped)  # the first distance lies on this face
    for e in chamfer1_edges_3:
        chamfer1.Add(CHAMFER1_SIZE, CHAMFER1_SIZE2, e.wrapped, chamfer1_side_3[0].wrapped)  # the first distance lies on this face
    add(Compound.cast(chamfer1.Shape()), mode=Mode.REPLACE)

    # Chamfer2
    chamfer2_edges = [part_1.edges().sort_by_distance(p)[0] for p in [
        (32.308547188, 13.146582531, 173.052275424),
        (38.458547188, 17.646582531, 173.052275424),
        (43.958547188, 4.146582531, 173.052275424),
        (46.058547188, 7.783889227, 173.052275424),
        (49.508547188, 8.216901929, 173.052275424),
        (49.508547188, 0.076263133, 173.052275424),
        (46.058547188, 0.509275835, 173.052275424),
        (52.358547188, 4.146582531, 173.052275424),
        (32.308547188, 22.146582531, 173.052275424),
        (28.658547188, 7.646582531, 173.052275424),
        (29.244333626, 12.560796093, 173.052275424),
        (29.244333626, 22.732368969, 173.052275424),
        (50.658547188, 27.646582531, 173.052275424),
        (28.658547188, 24.396582531, 173.052275424),
        (72.658547188, 6.146582531, 173.052275424),
        (29.537226844, 26.767902875, 173.052275424),
        (71.779867531, -14.474737813, 173.052275424),
        (71.779867531, 26.767902875, 173.052275424),
        (58.908547188, -15.353417469, 173.052275424),
        (34.369964955, -9.641999702, 173.052275424),
    ]]
    chamfer(chamfer2_edges, length=CHAMFER2_SIZE)

    # Fillet6
    fillet6_edges = [part_1.edges().sort_by_distance(p)[0] for p in [
        (32.308547188, 13.146582531, 180.052275424),
        (38.067401264, 15.811557141, 180.052275424),
        (28.658547188, 7.646582531, 180.052275424),
        (29.244333626, 12.560796093, 180.052275424),
        (52.736005544, -15.353417469, 180.052275424),
        (34.369964955, -9.641999702, 180.052275424),
    ]]
    fillet(fillet6_edges, radius=FILLET6_R)


solid = part_1.part
